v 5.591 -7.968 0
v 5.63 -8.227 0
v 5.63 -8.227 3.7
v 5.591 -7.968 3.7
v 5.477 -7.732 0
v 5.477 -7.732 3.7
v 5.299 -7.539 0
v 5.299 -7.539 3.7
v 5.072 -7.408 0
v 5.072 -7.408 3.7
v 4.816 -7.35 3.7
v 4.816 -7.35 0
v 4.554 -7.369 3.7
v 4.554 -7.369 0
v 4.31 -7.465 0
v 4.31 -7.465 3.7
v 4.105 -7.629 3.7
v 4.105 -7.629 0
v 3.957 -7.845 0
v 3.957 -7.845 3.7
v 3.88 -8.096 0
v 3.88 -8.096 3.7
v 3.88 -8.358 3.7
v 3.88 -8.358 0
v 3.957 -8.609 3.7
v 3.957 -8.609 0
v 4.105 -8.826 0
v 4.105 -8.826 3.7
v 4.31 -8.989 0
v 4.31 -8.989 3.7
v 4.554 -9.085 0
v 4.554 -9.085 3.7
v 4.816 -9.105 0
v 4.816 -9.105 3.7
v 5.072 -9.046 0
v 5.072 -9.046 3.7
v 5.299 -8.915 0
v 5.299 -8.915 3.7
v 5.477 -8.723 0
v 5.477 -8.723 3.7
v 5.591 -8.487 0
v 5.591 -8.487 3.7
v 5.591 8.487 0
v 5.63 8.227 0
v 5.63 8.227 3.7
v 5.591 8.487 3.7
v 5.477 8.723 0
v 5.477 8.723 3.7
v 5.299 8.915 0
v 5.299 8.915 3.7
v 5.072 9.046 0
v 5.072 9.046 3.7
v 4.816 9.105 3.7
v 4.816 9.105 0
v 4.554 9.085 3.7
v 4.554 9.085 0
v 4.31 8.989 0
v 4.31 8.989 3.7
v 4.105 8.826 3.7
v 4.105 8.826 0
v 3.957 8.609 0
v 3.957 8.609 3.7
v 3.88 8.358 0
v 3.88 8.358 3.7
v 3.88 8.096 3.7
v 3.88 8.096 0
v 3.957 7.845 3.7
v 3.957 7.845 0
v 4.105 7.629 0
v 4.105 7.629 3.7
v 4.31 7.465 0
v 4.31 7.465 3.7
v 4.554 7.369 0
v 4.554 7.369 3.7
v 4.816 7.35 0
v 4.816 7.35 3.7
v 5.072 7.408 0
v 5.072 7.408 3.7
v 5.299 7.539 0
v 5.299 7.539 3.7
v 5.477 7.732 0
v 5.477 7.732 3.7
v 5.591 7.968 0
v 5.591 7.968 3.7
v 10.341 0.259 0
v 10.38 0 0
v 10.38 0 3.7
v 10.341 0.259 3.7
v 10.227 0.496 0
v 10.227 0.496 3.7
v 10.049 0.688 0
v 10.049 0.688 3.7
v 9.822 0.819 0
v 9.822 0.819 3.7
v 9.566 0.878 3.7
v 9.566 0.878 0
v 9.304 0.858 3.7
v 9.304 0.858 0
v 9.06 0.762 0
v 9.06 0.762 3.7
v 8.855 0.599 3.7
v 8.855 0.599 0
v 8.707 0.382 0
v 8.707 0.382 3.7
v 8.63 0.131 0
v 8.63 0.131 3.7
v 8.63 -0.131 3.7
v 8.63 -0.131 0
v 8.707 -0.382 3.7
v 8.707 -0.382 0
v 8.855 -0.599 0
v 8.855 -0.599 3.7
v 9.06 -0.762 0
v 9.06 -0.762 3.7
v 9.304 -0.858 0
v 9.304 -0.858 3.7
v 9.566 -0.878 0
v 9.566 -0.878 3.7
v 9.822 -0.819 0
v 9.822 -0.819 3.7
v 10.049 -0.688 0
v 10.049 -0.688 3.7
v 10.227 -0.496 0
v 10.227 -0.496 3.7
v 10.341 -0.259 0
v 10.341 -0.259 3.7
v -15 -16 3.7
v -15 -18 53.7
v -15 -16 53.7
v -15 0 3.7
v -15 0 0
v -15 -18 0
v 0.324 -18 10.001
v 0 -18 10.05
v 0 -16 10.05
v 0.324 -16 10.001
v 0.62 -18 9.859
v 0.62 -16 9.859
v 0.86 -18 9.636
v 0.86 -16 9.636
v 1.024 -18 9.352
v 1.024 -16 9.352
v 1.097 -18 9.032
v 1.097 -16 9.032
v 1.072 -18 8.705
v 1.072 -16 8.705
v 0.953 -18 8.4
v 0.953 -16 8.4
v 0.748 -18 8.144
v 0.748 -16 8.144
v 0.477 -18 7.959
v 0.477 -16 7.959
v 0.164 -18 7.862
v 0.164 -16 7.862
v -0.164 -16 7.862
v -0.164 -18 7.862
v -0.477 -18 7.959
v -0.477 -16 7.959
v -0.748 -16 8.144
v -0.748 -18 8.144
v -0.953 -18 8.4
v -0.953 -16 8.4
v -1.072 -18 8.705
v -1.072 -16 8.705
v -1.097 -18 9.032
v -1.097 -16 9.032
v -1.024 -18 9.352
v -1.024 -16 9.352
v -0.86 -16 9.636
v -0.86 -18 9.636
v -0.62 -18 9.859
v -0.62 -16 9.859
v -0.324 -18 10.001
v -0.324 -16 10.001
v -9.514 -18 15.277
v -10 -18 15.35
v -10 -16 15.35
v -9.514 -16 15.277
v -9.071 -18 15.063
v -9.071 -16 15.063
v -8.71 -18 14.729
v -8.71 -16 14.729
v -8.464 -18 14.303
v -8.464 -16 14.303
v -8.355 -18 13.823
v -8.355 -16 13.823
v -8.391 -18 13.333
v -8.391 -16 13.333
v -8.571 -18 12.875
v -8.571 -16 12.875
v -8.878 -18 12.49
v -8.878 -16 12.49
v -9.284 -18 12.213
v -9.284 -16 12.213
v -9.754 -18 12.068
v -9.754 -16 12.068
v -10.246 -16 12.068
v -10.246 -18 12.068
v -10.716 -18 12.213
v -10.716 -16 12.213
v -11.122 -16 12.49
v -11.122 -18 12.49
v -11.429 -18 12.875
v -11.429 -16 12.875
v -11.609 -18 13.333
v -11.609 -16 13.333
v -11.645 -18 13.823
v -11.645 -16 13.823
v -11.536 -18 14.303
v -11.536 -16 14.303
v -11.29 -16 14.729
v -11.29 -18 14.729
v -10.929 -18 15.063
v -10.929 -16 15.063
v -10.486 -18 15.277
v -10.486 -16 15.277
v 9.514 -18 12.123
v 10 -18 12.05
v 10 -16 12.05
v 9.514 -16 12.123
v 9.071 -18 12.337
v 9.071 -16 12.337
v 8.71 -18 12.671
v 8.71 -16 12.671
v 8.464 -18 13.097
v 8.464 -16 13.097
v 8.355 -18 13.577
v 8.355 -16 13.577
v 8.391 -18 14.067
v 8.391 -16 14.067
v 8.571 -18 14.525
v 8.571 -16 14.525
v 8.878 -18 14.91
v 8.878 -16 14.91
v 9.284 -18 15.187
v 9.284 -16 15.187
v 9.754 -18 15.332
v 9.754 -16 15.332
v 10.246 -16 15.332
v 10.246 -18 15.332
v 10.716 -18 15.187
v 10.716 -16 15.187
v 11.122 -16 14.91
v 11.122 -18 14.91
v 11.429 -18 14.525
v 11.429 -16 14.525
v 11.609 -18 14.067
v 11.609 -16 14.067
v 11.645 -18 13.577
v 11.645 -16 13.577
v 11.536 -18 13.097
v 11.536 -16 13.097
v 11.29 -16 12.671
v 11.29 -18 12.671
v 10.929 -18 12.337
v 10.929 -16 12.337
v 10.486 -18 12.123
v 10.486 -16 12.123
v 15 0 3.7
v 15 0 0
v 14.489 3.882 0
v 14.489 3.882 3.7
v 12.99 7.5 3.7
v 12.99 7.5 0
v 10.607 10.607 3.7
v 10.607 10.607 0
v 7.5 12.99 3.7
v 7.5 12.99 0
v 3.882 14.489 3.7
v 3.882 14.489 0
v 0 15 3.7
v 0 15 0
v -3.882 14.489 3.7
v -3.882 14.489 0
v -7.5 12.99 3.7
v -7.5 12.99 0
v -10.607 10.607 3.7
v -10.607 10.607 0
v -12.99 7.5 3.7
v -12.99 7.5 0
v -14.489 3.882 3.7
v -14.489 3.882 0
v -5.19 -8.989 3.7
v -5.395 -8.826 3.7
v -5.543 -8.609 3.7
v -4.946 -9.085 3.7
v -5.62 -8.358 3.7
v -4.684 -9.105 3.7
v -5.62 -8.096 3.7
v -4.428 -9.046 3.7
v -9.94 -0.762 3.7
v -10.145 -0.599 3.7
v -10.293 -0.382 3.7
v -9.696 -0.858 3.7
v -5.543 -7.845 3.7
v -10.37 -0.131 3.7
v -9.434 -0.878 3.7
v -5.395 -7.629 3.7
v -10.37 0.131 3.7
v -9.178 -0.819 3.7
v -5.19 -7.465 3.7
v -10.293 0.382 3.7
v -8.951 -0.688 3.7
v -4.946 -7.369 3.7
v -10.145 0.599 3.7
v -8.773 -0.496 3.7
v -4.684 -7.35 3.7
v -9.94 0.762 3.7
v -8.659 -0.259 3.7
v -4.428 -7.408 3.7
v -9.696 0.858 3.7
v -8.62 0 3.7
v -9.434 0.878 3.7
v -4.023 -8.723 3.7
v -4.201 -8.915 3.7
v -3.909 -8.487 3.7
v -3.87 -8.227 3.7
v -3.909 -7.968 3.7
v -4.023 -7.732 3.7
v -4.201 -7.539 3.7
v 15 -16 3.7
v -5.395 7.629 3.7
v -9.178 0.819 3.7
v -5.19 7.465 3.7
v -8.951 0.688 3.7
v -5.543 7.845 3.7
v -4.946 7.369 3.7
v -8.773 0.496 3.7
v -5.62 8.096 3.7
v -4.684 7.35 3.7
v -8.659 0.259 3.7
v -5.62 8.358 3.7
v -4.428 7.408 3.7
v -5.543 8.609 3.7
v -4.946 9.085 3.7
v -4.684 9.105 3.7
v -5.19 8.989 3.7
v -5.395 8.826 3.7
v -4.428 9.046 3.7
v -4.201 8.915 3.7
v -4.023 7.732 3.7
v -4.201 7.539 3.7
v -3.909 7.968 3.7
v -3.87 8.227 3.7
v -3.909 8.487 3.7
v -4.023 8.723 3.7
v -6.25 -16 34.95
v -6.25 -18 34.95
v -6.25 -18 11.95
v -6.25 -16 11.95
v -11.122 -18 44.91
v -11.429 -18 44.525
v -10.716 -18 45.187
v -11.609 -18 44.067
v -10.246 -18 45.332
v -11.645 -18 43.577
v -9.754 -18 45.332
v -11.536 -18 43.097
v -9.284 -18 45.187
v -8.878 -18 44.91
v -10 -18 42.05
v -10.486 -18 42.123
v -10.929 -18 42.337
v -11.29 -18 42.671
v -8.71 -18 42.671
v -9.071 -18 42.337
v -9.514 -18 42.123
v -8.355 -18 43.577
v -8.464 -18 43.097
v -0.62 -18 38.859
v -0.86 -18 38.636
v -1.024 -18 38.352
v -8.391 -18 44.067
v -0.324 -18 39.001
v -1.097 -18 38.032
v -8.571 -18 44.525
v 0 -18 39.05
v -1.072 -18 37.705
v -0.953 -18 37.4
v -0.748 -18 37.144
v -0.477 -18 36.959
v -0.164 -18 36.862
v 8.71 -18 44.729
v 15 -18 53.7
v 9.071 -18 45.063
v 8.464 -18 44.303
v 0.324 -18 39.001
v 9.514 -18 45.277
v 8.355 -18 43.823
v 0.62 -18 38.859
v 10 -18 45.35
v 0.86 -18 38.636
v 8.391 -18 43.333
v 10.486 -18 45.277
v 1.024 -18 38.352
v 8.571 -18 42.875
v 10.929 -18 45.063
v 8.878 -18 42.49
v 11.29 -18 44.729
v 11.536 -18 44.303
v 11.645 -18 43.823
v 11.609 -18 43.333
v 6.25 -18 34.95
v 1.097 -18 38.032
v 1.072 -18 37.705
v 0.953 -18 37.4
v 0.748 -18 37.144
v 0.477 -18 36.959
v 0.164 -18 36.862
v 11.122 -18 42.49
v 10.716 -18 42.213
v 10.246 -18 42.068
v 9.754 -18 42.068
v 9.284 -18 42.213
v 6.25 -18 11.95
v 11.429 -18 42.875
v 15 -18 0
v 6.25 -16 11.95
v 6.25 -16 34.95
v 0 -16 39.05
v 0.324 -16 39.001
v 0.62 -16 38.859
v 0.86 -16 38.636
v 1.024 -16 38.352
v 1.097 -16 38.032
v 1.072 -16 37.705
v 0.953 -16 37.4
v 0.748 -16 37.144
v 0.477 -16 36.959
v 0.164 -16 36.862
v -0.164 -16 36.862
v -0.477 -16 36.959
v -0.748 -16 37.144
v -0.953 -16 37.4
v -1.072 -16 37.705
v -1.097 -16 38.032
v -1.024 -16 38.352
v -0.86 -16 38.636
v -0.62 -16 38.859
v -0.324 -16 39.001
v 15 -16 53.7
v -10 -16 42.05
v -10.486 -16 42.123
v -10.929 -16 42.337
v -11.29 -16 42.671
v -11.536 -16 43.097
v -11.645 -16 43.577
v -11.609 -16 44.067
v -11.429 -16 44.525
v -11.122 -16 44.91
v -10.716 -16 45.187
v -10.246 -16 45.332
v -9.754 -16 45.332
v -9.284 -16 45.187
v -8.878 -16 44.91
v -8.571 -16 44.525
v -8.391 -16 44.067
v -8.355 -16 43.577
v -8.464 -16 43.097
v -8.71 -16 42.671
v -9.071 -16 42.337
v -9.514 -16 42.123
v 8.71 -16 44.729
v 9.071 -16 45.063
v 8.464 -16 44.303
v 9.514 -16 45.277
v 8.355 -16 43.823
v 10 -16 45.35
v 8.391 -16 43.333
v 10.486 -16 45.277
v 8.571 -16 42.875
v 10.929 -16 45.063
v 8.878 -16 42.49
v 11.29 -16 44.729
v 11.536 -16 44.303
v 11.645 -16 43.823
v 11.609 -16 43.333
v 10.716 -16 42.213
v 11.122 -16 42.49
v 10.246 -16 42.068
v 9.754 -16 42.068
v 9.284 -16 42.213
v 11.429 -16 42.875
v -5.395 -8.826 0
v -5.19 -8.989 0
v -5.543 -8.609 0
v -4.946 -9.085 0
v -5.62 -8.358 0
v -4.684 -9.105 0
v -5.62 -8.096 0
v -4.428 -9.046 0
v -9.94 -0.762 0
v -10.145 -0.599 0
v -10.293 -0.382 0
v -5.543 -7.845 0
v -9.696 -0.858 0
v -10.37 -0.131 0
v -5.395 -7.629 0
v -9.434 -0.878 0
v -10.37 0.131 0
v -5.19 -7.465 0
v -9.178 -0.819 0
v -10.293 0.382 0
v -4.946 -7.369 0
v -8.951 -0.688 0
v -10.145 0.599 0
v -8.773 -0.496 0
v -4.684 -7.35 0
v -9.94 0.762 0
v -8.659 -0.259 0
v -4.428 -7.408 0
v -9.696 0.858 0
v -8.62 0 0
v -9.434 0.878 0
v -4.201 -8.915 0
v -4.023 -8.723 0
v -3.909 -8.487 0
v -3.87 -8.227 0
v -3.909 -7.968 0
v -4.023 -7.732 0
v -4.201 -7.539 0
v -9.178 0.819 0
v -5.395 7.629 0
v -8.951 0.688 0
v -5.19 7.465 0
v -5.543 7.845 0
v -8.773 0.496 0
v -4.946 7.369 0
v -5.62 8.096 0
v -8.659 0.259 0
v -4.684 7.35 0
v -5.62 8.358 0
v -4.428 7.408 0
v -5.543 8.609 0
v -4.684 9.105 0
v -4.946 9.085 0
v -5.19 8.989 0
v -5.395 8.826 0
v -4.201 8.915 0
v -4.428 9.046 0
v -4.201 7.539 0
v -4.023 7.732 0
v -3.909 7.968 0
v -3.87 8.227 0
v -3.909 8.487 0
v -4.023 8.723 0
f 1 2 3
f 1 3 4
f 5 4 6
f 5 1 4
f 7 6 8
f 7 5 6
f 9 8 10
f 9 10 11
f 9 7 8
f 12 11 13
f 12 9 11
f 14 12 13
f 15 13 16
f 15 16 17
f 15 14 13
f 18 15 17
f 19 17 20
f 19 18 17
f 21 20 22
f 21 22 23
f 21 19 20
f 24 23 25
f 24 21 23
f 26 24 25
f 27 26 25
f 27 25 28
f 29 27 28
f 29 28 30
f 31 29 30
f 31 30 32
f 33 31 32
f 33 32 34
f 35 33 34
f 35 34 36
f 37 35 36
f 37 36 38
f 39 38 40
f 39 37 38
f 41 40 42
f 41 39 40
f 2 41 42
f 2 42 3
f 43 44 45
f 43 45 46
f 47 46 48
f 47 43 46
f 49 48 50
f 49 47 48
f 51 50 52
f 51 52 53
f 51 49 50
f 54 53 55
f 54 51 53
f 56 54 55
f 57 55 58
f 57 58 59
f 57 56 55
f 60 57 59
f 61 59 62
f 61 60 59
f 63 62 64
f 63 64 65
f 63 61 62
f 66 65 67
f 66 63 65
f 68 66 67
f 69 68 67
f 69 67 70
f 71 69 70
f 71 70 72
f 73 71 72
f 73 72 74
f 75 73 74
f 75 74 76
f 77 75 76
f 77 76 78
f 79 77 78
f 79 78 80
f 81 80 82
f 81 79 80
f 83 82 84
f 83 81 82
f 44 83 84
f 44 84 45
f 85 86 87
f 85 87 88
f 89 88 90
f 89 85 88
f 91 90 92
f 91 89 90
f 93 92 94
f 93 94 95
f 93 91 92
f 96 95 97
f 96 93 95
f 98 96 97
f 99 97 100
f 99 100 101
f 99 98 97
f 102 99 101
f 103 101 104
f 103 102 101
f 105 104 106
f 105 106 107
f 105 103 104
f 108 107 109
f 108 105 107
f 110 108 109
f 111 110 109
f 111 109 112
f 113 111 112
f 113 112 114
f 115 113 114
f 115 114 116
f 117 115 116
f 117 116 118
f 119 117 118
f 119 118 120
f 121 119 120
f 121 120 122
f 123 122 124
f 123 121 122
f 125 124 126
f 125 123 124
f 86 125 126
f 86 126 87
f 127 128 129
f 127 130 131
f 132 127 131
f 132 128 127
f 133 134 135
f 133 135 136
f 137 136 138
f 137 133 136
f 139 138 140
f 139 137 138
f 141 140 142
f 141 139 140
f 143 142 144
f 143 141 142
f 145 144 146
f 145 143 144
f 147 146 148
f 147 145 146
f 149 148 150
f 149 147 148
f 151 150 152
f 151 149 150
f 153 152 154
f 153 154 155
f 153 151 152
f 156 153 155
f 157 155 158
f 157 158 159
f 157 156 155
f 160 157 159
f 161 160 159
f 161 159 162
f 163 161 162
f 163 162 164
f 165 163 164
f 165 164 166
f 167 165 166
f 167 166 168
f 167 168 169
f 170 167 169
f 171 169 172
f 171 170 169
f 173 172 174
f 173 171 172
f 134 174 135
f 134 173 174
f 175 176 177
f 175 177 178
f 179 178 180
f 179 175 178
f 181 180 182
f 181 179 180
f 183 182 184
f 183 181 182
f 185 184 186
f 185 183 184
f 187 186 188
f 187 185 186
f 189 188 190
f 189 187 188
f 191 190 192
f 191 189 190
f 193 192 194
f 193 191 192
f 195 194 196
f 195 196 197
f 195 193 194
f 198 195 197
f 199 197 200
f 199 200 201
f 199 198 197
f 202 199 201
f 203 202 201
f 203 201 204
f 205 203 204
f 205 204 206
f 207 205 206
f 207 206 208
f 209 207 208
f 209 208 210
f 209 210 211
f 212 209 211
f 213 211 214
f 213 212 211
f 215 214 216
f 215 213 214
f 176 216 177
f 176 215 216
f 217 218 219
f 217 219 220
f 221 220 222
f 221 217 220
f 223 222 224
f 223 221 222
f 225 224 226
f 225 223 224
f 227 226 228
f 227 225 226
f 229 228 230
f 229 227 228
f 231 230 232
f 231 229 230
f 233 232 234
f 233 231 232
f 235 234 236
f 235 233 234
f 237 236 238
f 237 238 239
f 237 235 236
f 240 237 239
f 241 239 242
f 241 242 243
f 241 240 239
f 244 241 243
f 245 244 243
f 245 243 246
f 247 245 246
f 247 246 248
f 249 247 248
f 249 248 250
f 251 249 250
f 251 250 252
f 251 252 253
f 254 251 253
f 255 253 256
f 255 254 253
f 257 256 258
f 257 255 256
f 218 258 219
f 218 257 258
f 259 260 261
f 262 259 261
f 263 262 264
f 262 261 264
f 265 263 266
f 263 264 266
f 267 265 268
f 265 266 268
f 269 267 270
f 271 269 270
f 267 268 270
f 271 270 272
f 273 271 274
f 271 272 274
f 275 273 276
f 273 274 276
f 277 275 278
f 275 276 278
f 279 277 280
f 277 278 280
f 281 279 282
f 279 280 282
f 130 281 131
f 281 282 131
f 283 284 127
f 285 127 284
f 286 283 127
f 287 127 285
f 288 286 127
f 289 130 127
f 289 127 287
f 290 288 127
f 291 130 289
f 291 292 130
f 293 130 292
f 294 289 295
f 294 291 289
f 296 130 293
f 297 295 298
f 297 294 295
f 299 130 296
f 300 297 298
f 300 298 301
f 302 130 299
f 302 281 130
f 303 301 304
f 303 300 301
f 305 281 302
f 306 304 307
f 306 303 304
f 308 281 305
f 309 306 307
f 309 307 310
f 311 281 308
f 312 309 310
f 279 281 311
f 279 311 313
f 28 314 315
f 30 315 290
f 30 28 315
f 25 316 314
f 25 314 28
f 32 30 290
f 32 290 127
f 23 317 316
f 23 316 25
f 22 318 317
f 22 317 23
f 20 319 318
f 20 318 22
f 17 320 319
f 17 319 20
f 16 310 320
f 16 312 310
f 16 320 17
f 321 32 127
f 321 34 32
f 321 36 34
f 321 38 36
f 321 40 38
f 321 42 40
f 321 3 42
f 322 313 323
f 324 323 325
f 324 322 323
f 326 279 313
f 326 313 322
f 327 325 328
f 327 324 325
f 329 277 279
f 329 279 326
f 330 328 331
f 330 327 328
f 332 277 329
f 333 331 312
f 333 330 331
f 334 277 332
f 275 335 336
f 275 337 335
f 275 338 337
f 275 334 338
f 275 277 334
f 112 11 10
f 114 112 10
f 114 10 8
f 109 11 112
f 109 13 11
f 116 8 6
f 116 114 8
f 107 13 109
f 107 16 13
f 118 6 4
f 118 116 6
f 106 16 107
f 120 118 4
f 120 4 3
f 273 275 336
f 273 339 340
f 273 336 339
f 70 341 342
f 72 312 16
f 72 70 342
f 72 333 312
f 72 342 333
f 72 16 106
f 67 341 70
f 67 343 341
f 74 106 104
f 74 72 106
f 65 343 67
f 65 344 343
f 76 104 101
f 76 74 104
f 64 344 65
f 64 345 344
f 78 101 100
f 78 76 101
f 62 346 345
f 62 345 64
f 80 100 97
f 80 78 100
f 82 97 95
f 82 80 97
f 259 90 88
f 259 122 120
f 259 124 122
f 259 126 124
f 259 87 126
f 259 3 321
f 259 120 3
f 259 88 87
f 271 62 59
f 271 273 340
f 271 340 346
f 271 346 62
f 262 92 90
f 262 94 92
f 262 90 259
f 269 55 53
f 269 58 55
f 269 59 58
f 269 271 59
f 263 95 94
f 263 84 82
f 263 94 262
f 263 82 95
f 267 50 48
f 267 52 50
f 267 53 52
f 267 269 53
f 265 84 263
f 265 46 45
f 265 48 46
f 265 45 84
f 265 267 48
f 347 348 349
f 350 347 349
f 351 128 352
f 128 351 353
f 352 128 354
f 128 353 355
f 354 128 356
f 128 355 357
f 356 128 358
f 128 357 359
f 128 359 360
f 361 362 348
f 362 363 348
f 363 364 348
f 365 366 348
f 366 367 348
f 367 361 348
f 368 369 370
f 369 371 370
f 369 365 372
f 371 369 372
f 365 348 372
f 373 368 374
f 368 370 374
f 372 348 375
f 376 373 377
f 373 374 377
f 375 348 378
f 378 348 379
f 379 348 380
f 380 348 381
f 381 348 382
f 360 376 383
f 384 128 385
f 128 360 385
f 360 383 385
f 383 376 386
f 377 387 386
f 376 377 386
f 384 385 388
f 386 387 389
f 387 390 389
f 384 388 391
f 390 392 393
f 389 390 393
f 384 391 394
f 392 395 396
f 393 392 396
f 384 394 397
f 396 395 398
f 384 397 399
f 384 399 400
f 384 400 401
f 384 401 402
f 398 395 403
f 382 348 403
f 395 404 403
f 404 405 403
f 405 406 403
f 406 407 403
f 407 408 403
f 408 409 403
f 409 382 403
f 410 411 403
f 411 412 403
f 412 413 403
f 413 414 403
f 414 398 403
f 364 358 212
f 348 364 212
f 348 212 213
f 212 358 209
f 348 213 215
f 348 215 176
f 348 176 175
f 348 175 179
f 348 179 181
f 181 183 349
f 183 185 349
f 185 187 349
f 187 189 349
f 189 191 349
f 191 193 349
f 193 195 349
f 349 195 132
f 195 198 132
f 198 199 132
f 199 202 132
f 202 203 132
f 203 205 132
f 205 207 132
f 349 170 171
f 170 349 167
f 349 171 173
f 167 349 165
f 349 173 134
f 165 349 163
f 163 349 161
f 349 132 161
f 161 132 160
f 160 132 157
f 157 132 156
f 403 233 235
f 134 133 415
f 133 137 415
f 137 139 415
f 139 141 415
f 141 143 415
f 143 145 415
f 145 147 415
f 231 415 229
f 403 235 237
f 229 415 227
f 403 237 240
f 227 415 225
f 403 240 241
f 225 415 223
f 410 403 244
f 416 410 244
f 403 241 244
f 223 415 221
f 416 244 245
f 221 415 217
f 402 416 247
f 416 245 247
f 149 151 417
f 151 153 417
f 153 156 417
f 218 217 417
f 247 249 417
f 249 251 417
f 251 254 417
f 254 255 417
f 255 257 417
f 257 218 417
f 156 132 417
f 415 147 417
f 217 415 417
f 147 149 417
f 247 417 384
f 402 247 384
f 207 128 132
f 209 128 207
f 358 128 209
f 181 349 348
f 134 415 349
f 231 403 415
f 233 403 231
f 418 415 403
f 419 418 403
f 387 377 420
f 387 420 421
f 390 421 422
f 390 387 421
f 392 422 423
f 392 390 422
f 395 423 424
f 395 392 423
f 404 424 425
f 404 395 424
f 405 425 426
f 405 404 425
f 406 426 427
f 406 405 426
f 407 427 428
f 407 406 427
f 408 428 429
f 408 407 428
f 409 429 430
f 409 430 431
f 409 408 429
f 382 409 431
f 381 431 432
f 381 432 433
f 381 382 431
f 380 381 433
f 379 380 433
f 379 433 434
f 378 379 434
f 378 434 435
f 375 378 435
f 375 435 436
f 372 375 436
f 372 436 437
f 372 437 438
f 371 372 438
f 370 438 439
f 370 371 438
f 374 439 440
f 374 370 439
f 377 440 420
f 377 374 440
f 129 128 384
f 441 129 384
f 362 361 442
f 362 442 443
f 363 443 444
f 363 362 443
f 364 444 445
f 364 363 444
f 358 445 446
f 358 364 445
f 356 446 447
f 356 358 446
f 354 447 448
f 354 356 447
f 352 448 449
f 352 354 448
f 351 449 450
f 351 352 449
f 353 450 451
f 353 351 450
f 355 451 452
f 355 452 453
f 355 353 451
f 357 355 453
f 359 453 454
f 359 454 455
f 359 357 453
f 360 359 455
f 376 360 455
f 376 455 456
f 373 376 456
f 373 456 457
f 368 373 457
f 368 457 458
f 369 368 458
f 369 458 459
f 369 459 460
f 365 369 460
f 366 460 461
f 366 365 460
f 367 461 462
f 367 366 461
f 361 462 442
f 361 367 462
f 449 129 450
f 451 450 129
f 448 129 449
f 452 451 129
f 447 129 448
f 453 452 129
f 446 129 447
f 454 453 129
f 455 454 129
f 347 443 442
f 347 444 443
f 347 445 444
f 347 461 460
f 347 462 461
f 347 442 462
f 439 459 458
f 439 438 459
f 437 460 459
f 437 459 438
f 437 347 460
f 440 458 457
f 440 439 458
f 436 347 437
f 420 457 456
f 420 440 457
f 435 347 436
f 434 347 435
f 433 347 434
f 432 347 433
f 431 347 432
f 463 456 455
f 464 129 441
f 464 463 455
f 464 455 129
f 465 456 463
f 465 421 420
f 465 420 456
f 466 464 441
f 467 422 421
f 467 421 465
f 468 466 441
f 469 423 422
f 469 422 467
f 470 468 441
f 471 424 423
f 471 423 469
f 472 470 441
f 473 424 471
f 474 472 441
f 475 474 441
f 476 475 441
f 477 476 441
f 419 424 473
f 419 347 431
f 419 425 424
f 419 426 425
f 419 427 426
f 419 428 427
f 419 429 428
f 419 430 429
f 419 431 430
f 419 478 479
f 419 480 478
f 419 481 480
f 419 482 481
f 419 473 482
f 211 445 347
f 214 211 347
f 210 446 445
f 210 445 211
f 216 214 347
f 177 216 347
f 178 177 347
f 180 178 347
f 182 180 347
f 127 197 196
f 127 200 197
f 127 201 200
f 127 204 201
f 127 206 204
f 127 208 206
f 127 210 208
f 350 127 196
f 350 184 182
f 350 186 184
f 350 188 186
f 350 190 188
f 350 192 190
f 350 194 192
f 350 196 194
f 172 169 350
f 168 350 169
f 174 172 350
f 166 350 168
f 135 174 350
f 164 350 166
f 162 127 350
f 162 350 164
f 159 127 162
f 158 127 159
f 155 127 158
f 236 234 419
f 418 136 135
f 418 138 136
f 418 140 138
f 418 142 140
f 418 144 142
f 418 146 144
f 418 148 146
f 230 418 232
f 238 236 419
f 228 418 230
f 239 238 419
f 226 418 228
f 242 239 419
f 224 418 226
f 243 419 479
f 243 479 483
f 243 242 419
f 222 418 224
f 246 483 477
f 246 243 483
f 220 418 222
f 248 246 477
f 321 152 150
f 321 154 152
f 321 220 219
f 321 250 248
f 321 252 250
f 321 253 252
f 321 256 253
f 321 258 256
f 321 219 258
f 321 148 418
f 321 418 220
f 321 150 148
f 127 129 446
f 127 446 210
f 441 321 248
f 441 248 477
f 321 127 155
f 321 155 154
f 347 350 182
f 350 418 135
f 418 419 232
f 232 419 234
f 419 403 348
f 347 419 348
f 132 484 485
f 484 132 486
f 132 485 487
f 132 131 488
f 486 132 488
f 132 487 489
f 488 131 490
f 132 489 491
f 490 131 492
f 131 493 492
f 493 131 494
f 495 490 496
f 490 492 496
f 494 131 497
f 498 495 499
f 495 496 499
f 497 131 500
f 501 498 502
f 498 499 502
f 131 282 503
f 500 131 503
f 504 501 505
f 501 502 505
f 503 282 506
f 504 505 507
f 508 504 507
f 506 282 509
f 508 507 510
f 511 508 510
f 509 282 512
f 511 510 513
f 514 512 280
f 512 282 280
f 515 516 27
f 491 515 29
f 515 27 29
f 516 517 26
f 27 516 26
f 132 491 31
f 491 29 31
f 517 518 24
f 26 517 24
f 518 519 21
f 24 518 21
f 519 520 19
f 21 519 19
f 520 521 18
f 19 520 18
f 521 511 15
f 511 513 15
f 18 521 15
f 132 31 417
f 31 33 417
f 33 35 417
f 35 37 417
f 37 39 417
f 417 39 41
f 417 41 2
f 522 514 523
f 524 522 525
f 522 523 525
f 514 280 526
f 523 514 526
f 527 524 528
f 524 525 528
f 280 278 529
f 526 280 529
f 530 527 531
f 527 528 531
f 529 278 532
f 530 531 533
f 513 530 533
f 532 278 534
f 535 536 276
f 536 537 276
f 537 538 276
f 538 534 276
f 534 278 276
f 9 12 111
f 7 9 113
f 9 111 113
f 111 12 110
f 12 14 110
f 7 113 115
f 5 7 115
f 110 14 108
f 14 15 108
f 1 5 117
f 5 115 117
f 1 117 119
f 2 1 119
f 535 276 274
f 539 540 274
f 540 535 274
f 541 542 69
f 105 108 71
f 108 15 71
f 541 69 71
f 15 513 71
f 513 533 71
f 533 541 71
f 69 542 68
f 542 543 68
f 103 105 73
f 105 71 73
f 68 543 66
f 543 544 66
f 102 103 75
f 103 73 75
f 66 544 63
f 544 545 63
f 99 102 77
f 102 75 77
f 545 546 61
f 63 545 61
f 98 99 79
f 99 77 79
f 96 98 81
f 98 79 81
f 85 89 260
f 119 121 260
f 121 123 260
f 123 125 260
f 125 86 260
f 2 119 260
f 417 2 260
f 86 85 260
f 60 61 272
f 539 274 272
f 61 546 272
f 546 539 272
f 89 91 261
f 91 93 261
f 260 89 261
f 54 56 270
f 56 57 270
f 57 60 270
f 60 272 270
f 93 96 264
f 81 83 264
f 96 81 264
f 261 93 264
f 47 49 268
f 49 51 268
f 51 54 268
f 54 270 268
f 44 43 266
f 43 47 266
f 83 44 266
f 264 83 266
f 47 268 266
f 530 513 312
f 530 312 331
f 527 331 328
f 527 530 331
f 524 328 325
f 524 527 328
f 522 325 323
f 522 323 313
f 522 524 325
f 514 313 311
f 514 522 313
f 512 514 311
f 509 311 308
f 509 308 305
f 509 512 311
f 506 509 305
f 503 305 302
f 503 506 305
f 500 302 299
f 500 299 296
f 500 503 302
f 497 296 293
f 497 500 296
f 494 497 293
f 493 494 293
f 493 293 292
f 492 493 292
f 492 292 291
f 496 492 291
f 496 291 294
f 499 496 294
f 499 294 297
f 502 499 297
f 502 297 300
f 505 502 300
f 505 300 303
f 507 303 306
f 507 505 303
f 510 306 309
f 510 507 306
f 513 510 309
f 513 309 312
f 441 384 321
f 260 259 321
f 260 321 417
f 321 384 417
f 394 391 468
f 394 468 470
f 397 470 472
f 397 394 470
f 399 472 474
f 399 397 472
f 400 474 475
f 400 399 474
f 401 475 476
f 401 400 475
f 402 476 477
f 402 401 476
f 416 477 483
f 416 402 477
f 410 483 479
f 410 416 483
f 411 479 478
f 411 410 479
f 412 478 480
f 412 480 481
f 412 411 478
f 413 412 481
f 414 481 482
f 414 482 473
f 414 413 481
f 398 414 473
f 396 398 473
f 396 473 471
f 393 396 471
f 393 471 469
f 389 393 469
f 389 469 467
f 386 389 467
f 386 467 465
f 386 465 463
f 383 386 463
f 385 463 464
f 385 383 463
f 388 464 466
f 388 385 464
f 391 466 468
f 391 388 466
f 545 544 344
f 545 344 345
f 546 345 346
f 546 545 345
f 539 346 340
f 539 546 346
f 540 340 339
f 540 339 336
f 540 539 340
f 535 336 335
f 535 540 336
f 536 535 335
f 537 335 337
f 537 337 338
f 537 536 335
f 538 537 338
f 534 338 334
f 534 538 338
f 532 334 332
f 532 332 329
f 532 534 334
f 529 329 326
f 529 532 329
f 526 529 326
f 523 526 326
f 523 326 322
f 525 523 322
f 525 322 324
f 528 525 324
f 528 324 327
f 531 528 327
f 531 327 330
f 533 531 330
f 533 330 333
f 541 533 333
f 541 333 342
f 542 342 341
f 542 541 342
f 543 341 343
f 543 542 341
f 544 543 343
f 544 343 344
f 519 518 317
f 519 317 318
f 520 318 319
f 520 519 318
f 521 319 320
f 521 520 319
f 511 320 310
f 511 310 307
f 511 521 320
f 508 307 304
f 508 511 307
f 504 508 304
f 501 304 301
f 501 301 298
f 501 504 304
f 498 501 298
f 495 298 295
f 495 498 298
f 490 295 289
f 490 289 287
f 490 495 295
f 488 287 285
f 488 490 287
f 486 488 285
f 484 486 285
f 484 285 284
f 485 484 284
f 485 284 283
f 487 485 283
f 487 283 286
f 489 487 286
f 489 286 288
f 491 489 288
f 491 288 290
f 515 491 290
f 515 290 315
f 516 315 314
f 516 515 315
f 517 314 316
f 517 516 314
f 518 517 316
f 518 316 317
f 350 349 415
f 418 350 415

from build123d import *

# Parameters (mm, degrees)
SKETCH_1_R      = 0.88
EXTRUDE_1_DEPTH = 3.7
SKETCH_3_W      = 30
SKETCH_3_H      = 50
SKETCH_3_R      = 1.65
SKETCH_3_R_2    = 1.1
EXTRUDE_2_DEPTH = 2


with BuildPart() as part:
    # 草图1 → 凸台-拉伸1 (new body)
    with BuildSketch(Plane.XY):
        with BuildLine():
            Line((-15, 0), (-15, -18))
            Line((-15, -18), (15, -18))
            Line((15, -18), (15, 0))
            ThreePointArc((15, 0), (0, 15), (-15, 0))
        make_face()
        with Locations((9.5, 0)):
            Circle(SKETCH_1_R, mode=Mode.SUBTRACT)
        with Locations((4.75, -8.227241336)):
            Circle(SKETCH_1_R, mode=Mode.SUBTRACT)
        with Locations((-4.75, -8.227241336)):
            Circle(SKETCH_1_R, mode=Mode.SUBTRACT)
        with Locations((-9.5, 0)):
            Circle(SKETCH_1_R, mode=Mode.SUBTRACT)
        with Locations((-4.75, 8.227241336)):
            Circle(SKETCH_1_R, mode=Mode.SUBTRACT)
        with Locations((4.75, 8.227241336)):
            Circle(SKETCH_1_R, mode=Mode.SUBTRACT)
    extrude(amount=EXTRUDE_1_DEPTH)

    # 草图3 → 凸台-拉伸2 (add)
    with BuildSketch(Plane(origin=(0, -18, 0), x_dir=(1, 0, 0), z_dir=(0, 1, 0))):
        with Locations((0, -28.7)):
            Rectangle(SKETCH_3_W, SKETCH_3_H)
        with Locations(Location((-10, -13.7, 0), (0, 0, 270))):
            Circle(SKETCH_3_R, mode=Mode.SUBTRACT)
        with Locations(Location((10, -13.7, 0), (0, 0, 90))):
            Circle(SKETCH_3_R, mode=Mode.SUBTRACT)
        with Locations(Location((10, -43.7, 0), (0, 0, 270))):
            Circle(SKETCH_3_R, mode=Mode.SUBTRACT)
        with Locations(Location((-10, -43.7, 0), (0, 0, 90))):
            Circle(SKETCH_3_R, mode=Mode.SUBTRACT)
        with Locations(Location((0, -8.95, 0), (0, 0, 270))):
            Circle(SKETCH_3_R_2, mode=Mode.SUBTRACT)
        with Locations(Location((0, -37.95, 0), (0, 0, 270))):
            Circle(SKETCH_3_R_2, mode=Mode.SUBTRACT)
        Polygon((-6.25, -28.7), (-6.25, -11.95), (6.25, -11.95), (6.25, -28.7), (6.25, -34.95), (-6.25, -34.95), align=None, mode=Mode.SUBTRACT)
    extrude(amount=EXTRUDE_2_DEPTH)


solid = part.part
